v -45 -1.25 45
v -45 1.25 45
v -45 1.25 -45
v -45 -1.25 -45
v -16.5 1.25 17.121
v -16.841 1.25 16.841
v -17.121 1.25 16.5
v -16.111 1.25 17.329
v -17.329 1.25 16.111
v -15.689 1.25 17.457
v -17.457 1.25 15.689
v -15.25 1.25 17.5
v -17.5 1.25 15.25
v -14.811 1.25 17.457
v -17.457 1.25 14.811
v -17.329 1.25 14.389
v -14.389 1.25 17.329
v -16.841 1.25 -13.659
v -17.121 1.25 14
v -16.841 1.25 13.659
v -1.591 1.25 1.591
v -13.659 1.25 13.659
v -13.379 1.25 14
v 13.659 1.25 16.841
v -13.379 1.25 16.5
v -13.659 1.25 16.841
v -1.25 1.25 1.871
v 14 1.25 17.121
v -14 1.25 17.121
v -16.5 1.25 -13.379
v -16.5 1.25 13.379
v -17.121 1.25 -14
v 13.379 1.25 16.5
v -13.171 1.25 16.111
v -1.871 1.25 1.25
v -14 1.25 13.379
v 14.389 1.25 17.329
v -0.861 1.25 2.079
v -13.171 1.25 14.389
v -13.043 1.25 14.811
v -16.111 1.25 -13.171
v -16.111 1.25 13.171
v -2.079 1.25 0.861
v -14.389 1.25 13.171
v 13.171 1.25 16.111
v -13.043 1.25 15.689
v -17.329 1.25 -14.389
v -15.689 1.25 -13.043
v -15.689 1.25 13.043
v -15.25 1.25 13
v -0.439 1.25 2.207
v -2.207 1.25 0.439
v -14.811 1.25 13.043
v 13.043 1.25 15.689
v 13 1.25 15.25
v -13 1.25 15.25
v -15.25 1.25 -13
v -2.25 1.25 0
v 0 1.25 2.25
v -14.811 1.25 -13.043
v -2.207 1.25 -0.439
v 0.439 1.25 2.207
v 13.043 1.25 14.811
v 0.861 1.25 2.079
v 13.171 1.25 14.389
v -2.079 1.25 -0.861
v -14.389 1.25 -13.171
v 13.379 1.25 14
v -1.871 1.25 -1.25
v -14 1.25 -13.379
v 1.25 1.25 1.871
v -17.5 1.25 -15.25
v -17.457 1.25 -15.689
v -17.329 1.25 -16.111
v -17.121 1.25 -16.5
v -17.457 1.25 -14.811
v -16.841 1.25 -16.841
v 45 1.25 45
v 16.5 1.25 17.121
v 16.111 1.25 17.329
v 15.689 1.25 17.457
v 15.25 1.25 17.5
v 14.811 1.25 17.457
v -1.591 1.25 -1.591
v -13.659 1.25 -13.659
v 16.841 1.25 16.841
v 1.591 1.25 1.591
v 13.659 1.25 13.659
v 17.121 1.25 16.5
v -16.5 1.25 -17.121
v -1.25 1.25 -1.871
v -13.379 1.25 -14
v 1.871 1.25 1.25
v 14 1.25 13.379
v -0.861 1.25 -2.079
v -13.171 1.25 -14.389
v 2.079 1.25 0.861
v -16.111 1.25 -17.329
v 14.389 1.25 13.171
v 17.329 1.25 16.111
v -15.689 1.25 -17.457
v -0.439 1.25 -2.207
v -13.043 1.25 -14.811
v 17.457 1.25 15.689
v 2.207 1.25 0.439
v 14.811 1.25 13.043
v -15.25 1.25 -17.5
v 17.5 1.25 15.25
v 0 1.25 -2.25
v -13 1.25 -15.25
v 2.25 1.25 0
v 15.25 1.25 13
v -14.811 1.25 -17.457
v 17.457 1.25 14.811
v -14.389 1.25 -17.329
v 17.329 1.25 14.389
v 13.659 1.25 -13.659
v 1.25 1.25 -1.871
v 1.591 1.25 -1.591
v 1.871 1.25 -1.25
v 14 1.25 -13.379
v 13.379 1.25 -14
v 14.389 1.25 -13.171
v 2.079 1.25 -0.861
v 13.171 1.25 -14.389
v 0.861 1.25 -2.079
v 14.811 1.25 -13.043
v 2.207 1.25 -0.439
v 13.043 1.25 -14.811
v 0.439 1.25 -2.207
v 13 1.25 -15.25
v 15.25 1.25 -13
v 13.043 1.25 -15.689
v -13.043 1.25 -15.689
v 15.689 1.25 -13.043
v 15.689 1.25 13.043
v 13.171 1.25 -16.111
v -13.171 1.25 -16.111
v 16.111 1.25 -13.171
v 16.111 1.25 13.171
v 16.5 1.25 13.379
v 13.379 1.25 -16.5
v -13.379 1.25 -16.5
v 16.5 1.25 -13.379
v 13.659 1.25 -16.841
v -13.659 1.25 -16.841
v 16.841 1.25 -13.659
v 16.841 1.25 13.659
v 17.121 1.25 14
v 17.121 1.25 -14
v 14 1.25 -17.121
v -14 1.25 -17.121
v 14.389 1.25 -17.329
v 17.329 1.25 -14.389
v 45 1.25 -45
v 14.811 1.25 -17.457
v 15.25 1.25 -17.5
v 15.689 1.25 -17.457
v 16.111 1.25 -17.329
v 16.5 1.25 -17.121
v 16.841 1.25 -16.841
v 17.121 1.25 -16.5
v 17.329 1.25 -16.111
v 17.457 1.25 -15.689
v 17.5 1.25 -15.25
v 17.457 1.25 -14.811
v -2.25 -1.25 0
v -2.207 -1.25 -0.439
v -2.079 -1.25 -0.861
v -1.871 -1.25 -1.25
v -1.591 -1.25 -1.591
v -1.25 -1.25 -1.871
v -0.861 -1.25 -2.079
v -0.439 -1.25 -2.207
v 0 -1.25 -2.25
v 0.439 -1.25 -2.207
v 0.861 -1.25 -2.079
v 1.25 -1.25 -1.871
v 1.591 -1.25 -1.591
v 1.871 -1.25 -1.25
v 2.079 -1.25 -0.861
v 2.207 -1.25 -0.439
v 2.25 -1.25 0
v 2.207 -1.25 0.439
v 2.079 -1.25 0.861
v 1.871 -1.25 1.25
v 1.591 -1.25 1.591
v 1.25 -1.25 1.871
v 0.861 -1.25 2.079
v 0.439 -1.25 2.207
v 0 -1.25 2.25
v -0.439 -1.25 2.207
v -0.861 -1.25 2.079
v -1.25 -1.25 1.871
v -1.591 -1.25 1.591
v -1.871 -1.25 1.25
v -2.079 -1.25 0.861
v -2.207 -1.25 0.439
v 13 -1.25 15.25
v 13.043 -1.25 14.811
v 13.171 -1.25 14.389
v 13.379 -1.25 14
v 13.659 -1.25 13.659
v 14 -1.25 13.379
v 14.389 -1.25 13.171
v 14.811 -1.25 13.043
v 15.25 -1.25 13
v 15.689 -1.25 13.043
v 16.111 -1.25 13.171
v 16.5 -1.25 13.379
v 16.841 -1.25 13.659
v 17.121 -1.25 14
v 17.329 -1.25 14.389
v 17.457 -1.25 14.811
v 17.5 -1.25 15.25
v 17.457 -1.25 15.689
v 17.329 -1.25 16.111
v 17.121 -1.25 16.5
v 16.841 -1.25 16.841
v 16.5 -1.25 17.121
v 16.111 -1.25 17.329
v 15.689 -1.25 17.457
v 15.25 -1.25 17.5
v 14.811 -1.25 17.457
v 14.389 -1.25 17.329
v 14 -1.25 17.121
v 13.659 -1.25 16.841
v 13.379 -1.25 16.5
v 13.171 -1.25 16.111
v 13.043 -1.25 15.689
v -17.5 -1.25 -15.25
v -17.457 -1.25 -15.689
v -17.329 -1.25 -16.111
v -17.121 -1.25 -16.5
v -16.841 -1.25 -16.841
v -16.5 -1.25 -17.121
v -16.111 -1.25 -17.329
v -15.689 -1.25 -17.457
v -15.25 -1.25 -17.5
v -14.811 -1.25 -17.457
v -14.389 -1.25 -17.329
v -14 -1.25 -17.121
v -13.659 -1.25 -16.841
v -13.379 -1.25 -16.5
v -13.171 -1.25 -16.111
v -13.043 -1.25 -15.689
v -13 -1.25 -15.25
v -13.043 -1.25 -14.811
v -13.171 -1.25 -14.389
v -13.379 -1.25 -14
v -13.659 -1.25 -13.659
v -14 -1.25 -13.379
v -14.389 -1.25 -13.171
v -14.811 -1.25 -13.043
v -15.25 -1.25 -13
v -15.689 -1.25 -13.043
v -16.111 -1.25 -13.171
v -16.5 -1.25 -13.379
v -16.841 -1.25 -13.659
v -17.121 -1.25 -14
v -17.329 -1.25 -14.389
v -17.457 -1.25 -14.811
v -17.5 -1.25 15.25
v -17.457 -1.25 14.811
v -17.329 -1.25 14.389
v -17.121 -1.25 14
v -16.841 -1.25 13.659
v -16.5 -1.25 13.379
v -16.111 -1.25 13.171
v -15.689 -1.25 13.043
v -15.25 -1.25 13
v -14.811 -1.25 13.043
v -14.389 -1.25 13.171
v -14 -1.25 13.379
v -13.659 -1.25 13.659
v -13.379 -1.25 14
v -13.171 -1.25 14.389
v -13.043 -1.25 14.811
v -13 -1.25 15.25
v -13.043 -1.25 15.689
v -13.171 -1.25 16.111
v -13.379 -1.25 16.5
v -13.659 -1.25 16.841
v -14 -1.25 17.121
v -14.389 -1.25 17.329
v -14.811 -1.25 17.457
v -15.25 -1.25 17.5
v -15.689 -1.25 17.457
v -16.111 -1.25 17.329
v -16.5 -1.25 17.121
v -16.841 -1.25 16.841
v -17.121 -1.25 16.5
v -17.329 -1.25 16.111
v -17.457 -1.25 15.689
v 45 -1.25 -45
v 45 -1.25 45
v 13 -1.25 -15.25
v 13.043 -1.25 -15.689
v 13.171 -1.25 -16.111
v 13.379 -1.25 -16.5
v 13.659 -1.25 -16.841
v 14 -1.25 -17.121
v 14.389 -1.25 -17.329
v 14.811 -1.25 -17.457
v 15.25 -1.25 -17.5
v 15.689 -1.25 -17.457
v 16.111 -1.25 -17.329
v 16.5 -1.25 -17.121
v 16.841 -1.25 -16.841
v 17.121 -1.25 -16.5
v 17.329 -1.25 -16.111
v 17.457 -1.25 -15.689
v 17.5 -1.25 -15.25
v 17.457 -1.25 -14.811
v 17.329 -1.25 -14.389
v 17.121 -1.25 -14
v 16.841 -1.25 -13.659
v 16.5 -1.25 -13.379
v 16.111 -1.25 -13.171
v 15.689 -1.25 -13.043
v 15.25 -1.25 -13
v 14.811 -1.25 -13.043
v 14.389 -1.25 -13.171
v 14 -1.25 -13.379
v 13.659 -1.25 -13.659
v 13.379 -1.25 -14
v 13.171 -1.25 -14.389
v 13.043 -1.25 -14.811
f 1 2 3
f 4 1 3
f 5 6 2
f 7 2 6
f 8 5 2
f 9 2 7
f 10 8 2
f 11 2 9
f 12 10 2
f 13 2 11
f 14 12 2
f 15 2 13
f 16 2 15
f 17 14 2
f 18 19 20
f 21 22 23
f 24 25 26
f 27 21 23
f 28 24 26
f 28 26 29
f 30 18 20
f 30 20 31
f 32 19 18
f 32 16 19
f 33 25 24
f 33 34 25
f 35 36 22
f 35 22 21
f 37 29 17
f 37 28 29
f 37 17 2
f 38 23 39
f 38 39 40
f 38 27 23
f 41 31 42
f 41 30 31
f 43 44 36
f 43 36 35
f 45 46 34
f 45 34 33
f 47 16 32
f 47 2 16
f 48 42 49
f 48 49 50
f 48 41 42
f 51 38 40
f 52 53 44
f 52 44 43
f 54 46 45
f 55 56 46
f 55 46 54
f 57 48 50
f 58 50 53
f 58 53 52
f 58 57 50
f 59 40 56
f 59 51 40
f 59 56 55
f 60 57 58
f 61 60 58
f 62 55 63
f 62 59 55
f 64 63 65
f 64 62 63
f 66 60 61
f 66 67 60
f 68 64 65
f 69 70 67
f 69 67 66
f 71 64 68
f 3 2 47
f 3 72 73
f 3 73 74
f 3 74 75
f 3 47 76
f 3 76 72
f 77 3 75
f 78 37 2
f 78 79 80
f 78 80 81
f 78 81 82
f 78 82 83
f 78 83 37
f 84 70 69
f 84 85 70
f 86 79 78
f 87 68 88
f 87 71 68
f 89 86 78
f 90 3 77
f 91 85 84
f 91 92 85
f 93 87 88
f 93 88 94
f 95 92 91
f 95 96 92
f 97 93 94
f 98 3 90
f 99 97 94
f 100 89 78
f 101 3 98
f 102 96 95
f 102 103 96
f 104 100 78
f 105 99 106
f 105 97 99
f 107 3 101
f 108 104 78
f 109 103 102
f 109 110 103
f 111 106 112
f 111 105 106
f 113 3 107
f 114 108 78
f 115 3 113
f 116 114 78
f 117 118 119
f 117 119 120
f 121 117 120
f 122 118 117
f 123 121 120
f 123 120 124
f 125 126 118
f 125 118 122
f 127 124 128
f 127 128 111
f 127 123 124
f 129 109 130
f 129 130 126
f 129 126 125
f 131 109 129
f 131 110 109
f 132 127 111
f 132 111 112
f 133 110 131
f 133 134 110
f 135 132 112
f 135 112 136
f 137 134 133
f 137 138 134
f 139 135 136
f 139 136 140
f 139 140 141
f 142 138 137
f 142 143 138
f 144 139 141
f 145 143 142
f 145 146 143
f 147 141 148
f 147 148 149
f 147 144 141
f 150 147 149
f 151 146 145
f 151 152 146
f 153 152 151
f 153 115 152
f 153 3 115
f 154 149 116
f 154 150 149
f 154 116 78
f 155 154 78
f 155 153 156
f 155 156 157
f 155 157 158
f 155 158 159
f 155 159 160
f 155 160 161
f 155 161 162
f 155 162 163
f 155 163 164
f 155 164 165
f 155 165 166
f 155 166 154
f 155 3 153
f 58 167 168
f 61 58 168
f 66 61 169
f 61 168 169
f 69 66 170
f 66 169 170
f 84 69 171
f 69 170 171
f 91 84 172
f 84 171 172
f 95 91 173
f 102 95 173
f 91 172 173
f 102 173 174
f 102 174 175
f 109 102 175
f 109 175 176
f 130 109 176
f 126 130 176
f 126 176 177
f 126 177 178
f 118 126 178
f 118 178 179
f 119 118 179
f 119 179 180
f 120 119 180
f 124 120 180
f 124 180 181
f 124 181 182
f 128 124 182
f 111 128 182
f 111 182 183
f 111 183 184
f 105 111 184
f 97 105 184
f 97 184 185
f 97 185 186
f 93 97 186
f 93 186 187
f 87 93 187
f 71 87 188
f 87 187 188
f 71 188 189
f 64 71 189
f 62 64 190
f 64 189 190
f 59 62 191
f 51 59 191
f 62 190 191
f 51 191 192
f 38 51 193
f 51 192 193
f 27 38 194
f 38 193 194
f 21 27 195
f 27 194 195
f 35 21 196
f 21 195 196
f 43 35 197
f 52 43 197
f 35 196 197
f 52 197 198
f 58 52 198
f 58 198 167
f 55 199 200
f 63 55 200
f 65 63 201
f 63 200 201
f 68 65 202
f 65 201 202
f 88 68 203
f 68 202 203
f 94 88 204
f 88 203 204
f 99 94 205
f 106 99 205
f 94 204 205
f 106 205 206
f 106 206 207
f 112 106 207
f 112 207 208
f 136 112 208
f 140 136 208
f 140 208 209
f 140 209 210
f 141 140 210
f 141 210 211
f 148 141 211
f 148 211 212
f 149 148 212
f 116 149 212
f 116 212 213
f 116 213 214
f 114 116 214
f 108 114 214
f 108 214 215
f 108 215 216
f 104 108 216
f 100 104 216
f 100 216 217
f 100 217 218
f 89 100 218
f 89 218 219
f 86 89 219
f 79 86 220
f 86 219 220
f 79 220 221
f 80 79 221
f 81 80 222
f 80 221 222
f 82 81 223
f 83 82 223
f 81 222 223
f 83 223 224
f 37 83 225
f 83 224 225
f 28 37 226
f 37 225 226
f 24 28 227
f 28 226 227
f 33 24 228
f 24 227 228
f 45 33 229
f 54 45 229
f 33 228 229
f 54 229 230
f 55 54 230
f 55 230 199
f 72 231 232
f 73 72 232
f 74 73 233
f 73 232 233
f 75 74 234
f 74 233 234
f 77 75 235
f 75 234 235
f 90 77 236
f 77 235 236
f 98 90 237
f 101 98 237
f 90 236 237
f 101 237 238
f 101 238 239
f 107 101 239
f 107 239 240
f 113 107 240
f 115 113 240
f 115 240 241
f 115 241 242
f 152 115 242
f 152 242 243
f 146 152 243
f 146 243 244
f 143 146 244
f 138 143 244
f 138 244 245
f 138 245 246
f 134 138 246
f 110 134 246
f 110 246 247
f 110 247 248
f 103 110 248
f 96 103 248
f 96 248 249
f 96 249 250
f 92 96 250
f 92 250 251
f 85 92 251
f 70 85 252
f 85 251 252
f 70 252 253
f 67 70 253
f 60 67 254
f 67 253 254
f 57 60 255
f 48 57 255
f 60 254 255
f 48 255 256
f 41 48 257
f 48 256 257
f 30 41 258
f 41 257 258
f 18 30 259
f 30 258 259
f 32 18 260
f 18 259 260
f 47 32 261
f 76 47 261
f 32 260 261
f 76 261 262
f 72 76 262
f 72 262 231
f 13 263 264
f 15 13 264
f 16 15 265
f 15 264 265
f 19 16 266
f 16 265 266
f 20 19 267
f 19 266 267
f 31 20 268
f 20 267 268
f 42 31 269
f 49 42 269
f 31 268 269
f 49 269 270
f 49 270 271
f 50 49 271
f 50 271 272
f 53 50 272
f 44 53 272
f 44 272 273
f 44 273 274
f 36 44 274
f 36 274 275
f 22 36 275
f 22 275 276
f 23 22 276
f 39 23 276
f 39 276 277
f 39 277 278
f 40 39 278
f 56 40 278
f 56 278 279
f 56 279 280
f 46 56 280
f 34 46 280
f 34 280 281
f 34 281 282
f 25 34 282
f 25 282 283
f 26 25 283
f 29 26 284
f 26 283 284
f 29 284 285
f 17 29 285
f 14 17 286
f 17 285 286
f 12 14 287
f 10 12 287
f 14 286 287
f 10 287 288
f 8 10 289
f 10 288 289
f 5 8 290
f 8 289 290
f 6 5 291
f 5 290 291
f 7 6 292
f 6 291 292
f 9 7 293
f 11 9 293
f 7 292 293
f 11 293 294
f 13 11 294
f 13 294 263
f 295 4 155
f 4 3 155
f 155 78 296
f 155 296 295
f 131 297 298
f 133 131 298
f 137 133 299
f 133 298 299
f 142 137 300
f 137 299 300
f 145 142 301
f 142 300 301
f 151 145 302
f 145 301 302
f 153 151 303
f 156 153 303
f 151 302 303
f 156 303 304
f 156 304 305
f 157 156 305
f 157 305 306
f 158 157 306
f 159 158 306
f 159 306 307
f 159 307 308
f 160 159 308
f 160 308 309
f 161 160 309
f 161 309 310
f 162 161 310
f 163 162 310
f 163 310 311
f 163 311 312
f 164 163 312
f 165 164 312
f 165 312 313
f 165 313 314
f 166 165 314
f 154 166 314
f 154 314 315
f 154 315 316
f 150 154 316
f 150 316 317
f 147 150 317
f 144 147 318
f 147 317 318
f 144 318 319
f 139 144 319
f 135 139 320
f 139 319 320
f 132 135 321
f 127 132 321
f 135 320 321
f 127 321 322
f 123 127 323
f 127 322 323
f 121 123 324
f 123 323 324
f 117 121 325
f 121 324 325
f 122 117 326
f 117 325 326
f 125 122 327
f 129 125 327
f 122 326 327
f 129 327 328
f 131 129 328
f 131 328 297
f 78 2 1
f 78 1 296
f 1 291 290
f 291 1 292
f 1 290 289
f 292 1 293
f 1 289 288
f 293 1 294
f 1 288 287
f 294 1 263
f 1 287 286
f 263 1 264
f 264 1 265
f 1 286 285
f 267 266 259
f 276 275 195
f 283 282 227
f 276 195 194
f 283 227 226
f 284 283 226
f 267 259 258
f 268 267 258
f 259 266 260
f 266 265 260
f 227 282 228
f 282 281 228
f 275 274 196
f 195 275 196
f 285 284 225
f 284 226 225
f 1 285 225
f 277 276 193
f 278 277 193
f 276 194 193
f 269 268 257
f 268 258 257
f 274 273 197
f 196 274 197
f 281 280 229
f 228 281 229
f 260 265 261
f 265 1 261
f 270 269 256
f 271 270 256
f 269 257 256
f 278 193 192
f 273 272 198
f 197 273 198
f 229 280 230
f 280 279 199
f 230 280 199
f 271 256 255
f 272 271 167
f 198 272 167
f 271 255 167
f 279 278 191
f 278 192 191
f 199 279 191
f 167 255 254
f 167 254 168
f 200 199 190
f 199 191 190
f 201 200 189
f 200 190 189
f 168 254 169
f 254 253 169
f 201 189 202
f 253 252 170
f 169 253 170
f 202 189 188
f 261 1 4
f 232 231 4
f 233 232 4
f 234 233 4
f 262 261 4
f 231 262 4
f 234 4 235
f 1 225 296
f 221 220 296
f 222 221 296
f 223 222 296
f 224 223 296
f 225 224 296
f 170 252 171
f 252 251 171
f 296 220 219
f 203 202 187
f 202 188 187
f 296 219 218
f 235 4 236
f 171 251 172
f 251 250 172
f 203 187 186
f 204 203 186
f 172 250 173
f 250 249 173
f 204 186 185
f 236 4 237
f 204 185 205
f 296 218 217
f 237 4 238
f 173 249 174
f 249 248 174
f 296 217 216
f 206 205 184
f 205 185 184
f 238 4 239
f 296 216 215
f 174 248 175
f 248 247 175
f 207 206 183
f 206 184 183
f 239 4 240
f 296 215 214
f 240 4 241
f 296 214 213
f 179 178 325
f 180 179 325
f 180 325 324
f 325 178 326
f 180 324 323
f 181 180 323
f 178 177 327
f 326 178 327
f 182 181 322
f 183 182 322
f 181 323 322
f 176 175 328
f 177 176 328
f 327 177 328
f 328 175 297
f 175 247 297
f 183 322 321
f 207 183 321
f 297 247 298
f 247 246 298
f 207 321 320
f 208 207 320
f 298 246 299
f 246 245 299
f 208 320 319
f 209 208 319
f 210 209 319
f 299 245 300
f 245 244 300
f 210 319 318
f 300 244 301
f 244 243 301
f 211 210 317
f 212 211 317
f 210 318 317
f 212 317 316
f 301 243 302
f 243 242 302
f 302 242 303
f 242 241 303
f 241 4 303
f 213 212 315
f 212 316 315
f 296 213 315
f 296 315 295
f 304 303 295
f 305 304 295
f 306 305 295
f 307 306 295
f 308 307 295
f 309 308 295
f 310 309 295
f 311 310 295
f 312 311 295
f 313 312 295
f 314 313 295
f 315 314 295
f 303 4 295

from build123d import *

# Parameters (mm, degrees)
SKETCH1_W                = 90
SKETCH1_H                = 90
BOSS_EXTRUDE1_DEPTH      = 1.25
M4_CLEARANCE_HOLE1_D     = 4.5
M4_CLEARANCE_HOLE1_DEPTH = 5.2
M4_CLEARANCE_HOLE1_TIP   = 1.351936393


with BuildPart() as part:
    # Sketch1 → Boss-Extrude1 (new, symmetric)
    with BuildSketch(Plane(origin=(0, 0, 0), x_dir=(1, 0, 0), z_dir=(0, 1, 0))):
        Rectangle(SKETCH1_W, SKETCH1_H)
    extrude(amount=BOSS_EXTRUDE1_DEPTH, both=True)

    # M4 Clearance Hole1
    with Locations(Plane(origin=(0, 1.25, 0), x_dir=(1, 0, 0), z_dir=(0, 1, 0))):
        with Locations((0, 0), (15.25, 15.25), (-15.25, -15.25), (-15.25, 15.25), (15.25, -15.25)):
            Hole(M4_CLEARANCE_HOLE1_D / 2, depth=M4_CLEARANCE_HOLE1_DEPTH)
            with Locations((0, 0, -(M4_CLEARANCE_HOLE1_DEPTH + M4_CLEARANCE_HOLE1_TIP / 2))):  # 118° drill point
                Cone(0, M4_CLEARANCE_HOLE1_D / 2, M4_CLEARANCE_HOLE1_TIP, mode=Mode.SUBTRACT)


solid = part.part
